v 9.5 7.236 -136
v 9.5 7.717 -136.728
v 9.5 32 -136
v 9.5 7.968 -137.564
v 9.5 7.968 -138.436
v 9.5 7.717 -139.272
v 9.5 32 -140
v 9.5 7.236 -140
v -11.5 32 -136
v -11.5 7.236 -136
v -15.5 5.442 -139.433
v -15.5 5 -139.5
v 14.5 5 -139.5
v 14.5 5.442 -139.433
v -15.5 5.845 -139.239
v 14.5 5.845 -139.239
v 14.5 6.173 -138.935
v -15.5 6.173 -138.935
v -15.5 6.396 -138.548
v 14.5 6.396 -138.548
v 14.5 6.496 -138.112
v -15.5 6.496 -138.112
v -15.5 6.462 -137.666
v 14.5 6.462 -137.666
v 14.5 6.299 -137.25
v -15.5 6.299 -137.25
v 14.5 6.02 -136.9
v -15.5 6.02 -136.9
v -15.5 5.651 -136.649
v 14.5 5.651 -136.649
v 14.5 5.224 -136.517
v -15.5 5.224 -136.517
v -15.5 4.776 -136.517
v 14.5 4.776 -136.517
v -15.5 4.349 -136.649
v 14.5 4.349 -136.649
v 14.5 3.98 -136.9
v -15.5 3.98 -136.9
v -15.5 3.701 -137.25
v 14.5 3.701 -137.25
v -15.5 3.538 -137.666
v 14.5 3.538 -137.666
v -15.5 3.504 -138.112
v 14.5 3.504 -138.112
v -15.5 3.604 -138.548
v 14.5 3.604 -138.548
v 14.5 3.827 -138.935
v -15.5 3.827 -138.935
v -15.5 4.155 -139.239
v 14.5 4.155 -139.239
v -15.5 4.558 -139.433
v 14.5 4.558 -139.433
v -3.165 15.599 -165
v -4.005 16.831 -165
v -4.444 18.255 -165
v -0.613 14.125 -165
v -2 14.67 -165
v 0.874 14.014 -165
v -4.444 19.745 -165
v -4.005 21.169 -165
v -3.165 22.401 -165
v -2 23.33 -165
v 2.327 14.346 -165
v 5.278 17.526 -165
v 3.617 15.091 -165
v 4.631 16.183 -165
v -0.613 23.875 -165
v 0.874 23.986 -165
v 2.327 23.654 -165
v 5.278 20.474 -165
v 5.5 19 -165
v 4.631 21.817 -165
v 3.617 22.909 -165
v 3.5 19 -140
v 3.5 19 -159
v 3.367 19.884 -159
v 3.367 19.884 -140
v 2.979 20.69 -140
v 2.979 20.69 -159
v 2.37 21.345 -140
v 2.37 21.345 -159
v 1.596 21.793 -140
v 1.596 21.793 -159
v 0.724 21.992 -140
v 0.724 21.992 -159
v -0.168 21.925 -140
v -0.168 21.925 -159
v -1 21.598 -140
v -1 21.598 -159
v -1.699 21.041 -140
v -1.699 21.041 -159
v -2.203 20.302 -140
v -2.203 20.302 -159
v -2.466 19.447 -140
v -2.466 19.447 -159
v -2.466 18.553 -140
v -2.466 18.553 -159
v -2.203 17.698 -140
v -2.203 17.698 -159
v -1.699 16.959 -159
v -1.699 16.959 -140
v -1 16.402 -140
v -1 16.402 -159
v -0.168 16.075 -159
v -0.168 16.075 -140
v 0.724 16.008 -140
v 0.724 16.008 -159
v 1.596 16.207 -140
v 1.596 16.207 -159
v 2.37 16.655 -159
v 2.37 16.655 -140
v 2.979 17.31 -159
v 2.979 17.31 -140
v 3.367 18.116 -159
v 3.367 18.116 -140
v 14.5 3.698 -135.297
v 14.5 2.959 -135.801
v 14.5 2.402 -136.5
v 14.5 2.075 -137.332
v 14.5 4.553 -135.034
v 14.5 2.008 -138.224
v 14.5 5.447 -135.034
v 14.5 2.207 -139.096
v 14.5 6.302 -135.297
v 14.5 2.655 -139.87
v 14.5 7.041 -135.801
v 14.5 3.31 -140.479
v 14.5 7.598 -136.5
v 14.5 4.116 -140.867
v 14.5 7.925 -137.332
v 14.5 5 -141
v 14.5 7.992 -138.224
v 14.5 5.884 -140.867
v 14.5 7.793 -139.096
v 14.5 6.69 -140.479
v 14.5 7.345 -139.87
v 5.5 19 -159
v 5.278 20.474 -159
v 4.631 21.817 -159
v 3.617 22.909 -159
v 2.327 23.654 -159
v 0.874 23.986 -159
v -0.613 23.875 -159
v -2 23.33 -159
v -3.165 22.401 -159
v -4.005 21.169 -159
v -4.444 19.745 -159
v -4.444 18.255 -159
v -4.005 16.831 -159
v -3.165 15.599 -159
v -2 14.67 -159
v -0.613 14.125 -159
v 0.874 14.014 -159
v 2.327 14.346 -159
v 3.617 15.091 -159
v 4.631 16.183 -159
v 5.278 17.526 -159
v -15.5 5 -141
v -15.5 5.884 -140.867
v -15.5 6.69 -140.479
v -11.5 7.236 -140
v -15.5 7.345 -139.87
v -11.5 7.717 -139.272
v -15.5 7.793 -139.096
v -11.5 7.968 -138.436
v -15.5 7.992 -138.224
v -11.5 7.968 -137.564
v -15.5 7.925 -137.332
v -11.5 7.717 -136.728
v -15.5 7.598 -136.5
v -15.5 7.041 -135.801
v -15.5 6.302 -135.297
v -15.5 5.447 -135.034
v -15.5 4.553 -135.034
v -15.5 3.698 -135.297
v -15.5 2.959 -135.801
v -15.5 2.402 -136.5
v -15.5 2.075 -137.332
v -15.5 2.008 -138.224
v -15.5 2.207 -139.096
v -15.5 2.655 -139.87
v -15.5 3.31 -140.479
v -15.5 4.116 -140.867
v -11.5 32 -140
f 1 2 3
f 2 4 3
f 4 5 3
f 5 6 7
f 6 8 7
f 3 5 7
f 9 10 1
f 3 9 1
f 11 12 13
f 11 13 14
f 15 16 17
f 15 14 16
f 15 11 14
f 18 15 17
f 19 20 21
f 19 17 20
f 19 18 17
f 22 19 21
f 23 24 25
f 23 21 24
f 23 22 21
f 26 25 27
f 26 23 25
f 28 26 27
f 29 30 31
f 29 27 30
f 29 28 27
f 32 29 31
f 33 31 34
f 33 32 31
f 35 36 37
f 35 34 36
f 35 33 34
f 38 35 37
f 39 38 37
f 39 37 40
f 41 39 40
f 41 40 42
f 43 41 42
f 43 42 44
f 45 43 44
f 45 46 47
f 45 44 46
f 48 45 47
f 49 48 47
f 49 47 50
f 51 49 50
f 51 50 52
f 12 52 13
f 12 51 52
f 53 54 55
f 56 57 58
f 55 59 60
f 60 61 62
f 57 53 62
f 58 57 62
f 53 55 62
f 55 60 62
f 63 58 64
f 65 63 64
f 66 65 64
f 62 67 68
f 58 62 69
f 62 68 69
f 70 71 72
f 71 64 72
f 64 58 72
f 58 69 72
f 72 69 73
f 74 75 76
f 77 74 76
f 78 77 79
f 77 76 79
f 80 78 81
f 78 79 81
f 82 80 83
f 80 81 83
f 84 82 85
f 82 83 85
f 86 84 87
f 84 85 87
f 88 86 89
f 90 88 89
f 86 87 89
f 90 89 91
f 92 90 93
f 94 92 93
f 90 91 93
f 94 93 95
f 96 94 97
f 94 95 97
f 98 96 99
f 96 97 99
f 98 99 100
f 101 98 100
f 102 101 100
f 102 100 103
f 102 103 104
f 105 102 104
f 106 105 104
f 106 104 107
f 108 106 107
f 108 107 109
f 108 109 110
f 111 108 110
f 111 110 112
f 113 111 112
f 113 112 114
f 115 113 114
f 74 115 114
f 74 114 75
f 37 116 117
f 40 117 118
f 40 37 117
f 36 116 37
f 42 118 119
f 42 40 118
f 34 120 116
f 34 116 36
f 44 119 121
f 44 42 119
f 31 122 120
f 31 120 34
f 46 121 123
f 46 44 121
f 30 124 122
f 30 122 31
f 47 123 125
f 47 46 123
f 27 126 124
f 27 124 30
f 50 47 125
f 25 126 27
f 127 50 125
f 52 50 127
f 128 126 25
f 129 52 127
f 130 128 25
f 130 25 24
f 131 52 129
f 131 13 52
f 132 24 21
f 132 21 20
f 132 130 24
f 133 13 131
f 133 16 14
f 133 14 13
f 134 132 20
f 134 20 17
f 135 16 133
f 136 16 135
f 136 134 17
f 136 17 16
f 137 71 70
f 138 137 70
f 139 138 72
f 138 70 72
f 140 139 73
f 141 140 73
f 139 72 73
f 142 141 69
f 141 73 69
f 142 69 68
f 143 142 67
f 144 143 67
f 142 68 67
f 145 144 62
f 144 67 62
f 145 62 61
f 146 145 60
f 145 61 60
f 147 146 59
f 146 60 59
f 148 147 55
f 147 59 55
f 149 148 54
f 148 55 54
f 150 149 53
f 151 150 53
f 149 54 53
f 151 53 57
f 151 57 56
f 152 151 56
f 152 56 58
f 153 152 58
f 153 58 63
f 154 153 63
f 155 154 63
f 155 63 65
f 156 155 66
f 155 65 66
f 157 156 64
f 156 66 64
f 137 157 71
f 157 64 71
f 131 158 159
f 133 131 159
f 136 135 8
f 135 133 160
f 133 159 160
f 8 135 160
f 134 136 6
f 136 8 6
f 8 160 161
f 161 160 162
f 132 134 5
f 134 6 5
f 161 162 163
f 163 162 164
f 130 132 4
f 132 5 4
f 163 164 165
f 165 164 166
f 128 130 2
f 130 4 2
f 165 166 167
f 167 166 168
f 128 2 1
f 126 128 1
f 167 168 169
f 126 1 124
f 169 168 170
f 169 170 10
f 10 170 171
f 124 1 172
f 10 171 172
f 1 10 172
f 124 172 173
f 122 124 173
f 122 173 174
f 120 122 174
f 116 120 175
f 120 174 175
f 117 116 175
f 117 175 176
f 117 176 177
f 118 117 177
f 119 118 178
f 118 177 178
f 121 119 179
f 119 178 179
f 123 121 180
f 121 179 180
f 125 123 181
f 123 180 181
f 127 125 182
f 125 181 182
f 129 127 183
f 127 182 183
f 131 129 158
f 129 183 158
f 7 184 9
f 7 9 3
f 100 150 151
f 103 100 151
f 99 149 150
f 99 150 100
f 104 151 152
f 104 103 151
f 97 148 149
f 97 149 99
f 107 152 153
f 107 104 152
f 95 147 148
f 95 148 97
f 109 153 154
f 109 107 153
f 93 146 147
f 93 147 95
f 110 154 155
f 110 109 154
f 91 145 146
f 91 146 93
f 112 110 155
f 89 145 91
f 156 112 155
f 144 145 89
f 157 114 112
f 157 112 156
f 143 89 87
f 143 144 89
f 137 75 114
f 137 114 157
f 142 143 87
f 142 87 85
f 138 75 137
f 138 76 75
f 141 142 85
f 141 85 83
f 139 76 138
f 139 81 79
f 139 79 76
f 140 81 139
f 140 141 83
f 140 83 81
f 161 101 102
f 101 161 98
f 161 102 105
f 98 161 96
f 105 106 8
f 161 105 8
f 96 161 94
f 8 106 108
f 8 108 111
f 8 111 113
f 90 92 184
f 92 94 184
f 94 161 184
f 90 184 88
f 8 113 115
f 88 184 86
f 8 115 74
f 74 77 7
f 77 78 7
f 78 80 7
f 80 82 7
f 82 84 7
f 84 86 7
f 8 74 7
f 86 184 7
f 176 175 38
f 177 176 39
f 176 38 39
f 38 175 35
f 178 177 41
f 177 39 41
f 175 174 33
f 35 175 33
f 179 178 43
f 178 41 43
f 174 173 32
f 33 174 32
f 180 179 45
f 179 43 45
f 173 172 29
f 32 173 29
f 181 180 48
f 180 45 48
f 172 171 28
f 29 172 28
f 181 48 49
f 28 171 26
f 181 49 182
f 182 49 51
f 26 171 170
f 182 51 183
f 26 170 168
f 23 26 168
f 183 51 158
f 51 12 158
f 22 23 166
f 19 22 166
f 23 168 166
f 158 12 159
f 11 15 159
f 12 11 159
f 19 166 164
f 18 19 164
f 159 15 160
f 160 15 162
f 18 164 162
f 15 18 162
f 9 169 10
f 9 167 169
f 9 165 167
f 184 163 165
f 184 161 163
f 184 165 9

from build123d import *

# Parameters (mm, degrees)
CYLINDER031_R     = 3
CYLINDER031_DEPTH = 21
BOX006_W          = 21
BOX006_H          = 25
BOX006_DEPTH      = 4
CYLINDER026_R     = 1.5
CYLINDER026_DEPTH = 52
CYLINDER021_R     = 3
CYLINDER021_DEPTH = 30
CYLINDER032_R     = 5
CYLINDER032_DEPTH = 6


with BuildPart() as cylindre027:
    # Cylinder031 → Cylinder031 (new body)
    with BuildSketch(Plane(origin=(3, 19, -161), x_dir=(1, 0, 0), z_dir=(0, 0, 1))):
        Circle(CYLINDER031_R)
    extrude(amount=CYLINDER031_DEPTH)


with BuildPart() as cube006:
    # Box006 → Box006 (new body)
    with BuildSketch(Plane(origin=(-9, 7, -140), x_dir=(1, 0, 0), z_dir=(0, 0, 1))):
        with Locations((10.5, 12.5)):
            Rectangle(BOX006_W, BOX006_H)
    extrude(amount=BOX006_DEPTH)


with BuildPart() as cylindre022:
    # Cylinder026 → Cylinder026 (new body)
    with BuildSketch(Plane(origin=(-26, 6, -138), x_dir=(0, 0, -1), z_dir=(1, 0, 0))):
        Circle(CYLINDER026_R)
    extrude(amount=CYLINDER026_DEPTH)


with BuildPart() as fusion006:
    # Cylinder021 → Cylinder021 (new body)
    with BuildSketch(Plane(origin=(-13, 6, -138), x_dir=(0, 0, -1), z_dir=(1, 0, 0))):
        Circle(CYLINDER021_R)
    extrude(amount=CYLINDER021_DEPTH)

    # Cut019: cut Cylindre022
    add(cylindre022.part, mode=Mode.SUBTRACT)


with BuildPart() as fusion006_1:
    # Cut019 placement: moved
    add(fusion006.part.moved(Location((0, -1, 0))))

    # Fusion005: union Cube006
    add(cube006.part)

    # Fusion006: union Cylindre027
    add(cylindre027.part)


with BuildPart() as pedale:
    # Cylinder032 → Cylinder032 (new body)
    with BuildSketch(Plane(origin=(3, 19, -165), x_dir=(1, 0, 0), z_dir=(0, 0, 1))):
        Circle(CYLINDER032_R)
    extrude(amount=CYLINDER032_DEPTH)

    # Fusion007: union Fusion006
    add(fusion006_1.part)


with BuildPart() as pedale_1:
    # Fusion007 placement: moved
    add(pedale.part.moved(Location((-2.5, 0, 0))))


solid = pedale_1.part
